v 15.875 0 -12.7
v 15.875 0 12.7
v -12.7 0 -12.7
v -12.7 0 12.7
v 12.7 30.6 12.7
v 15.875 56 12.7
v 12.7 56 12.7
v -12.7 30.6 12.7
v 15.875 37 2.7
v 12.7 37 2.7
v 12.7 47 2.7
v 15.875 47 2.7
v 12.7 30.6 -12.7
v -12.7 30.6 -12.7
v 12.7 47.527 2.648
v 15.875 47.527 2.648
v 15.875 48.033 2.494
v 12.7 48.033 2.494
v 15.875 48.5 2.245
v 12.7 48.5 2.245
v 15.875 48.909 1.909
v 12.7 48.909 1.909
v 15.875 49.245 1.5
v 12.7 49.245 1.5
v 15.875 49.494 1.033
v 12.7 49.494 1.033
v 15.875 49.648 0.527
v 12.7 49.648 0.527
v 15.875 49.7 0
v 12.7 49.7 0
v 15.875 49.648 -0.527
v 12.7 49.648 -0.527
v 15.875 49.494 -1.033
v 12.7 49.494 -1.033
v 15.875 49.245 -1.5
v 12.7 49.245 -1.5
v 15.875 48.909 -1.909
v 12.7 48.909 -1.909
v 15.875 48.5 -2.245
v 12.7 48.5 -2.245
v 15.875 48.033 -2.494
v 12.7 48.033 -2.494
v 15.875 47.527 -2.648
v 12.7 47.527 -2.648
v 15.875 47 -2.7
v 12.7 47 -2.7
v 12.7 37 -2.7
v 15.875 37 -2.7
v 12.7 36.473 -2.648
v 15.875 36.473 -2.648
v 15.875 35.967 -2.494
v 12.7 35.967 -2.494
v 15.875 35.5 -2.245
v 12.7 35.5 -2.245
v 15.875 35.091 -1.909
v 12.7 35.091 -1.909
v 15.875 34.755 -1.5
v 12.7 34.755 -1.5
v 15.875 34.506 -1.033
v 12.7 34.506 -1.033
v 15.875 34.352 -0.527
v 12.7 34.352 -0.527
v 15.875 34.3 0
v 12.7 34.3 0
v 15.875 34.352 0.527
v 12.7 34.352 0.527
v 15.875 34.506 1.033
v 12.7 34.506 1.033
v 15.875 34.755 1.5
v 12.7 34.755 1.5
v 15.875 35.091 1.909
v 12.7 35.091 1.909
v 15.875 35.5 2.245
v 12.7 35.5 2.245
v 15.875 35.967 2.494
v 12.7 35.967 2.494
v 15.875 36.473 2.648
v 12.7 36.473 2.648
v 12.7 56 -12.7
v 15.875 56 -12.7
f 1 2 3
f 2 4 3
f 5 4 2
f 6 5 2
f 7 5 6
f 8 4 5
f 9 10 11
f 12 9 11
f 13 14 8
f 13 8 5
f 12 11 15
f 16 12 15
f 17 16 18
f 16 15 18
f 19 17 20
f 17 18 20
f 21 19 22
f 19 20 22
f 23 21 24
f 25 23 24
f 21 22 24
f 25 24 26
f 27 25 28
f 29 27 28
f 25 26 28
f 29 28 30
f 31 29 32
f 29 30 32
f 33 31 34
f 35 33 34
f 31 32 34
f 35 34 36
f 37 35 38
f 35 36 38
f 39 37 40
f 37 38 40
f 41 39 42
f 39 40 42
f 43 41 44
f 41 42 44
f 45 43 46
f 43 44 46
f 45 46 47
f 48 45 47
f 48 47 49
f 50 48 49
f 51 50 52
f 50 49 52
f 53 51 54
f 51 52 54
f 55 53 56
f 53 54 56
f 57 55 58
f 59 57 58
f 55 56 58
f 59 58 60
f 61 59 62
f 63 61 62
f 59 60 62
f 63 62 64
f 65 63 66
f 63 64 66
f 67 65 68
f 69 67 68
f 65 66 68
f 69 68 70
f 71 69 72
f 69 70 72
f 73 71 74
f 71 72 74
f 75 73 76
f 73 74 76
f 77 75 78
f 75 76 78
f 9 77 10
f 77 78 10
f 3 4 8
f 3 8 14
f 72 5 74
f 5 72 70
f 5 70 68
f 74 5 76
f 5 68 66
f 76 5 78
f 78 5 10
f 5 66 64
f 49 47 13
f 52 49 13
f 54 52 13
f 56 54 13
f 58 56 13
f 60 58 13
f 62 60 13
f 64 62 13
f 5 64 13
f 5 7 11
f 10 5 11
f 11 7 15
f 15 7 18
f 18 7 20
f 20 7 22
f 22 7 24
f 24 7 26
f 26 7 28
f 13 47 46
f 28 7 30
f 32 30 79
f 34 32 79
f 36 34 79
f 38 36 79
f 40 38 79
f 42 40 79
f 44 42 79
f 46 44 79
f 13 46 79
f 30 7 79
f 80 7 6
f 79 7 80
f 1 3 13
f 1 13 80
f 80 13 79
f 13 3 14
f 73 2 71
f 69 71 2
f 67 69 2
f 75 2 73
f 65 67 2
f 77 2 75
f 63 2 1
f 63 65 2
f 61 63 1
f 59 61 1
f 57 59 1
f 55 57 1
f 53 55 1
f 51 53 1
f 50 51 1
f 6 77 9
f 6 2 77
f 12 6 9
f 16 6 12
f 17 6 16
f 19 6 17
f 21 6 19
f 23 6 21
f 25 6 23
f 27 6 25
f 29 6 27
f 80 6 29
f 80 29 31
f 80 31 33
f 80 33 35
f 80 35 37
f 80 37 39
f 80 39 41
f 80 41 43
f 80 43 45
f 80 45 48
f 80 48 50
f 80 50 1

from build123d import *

# Parameters (mm, degrees)
SKETCH1_W           = 25.4
SKETCH1_H           = 25.4
BOSS_EXTRUDE1_DEPTH = 30.6
SKETCH2_W           = 25.4
SKETCH2_H           = 56
BOSS_EXTRUDE2_DEPTH = 3.175


with BuildPart() as part:
    # Sketch1 → Boss-Extrude1 (new body)
    with BuildSketch(Plane(origin=(0, 0, 0), x_dir=(1, 0, 0), z_dir=(0, 1, 0))):
        Rectangle(SKETCH1_W, SKETCH1_H)
    extrude(amount=BOSS_EXTRUDE1_DEPTH)

    # Sketch2 → Boss-Extrude2 (add)
    with BuildSketch(Plane(origin=(12.7, 0, 0), x_dir=(0, 0, -1), z_dir=(1, 0, 0))):
        with Locations((0, 28)):
            Rectangle(SKETCH2_W, SKETCH2_H)
        with BuildLine():
            Line((2.7, 47), (2.7, 37))
            ThreePointArc((2.7, 37), (0, 34.3), (-2.7, 37))
            Line((-2.7, 37), (-2.7, 47))
            ThreePointArc((-2.7, 47), (0, 49.7), (2.7, 47))
        make_face(mode=Mode.SUBTRACT)
    extrude(amount=BOSS_EXTRUDE2_DEPTH)


solid = part.part
